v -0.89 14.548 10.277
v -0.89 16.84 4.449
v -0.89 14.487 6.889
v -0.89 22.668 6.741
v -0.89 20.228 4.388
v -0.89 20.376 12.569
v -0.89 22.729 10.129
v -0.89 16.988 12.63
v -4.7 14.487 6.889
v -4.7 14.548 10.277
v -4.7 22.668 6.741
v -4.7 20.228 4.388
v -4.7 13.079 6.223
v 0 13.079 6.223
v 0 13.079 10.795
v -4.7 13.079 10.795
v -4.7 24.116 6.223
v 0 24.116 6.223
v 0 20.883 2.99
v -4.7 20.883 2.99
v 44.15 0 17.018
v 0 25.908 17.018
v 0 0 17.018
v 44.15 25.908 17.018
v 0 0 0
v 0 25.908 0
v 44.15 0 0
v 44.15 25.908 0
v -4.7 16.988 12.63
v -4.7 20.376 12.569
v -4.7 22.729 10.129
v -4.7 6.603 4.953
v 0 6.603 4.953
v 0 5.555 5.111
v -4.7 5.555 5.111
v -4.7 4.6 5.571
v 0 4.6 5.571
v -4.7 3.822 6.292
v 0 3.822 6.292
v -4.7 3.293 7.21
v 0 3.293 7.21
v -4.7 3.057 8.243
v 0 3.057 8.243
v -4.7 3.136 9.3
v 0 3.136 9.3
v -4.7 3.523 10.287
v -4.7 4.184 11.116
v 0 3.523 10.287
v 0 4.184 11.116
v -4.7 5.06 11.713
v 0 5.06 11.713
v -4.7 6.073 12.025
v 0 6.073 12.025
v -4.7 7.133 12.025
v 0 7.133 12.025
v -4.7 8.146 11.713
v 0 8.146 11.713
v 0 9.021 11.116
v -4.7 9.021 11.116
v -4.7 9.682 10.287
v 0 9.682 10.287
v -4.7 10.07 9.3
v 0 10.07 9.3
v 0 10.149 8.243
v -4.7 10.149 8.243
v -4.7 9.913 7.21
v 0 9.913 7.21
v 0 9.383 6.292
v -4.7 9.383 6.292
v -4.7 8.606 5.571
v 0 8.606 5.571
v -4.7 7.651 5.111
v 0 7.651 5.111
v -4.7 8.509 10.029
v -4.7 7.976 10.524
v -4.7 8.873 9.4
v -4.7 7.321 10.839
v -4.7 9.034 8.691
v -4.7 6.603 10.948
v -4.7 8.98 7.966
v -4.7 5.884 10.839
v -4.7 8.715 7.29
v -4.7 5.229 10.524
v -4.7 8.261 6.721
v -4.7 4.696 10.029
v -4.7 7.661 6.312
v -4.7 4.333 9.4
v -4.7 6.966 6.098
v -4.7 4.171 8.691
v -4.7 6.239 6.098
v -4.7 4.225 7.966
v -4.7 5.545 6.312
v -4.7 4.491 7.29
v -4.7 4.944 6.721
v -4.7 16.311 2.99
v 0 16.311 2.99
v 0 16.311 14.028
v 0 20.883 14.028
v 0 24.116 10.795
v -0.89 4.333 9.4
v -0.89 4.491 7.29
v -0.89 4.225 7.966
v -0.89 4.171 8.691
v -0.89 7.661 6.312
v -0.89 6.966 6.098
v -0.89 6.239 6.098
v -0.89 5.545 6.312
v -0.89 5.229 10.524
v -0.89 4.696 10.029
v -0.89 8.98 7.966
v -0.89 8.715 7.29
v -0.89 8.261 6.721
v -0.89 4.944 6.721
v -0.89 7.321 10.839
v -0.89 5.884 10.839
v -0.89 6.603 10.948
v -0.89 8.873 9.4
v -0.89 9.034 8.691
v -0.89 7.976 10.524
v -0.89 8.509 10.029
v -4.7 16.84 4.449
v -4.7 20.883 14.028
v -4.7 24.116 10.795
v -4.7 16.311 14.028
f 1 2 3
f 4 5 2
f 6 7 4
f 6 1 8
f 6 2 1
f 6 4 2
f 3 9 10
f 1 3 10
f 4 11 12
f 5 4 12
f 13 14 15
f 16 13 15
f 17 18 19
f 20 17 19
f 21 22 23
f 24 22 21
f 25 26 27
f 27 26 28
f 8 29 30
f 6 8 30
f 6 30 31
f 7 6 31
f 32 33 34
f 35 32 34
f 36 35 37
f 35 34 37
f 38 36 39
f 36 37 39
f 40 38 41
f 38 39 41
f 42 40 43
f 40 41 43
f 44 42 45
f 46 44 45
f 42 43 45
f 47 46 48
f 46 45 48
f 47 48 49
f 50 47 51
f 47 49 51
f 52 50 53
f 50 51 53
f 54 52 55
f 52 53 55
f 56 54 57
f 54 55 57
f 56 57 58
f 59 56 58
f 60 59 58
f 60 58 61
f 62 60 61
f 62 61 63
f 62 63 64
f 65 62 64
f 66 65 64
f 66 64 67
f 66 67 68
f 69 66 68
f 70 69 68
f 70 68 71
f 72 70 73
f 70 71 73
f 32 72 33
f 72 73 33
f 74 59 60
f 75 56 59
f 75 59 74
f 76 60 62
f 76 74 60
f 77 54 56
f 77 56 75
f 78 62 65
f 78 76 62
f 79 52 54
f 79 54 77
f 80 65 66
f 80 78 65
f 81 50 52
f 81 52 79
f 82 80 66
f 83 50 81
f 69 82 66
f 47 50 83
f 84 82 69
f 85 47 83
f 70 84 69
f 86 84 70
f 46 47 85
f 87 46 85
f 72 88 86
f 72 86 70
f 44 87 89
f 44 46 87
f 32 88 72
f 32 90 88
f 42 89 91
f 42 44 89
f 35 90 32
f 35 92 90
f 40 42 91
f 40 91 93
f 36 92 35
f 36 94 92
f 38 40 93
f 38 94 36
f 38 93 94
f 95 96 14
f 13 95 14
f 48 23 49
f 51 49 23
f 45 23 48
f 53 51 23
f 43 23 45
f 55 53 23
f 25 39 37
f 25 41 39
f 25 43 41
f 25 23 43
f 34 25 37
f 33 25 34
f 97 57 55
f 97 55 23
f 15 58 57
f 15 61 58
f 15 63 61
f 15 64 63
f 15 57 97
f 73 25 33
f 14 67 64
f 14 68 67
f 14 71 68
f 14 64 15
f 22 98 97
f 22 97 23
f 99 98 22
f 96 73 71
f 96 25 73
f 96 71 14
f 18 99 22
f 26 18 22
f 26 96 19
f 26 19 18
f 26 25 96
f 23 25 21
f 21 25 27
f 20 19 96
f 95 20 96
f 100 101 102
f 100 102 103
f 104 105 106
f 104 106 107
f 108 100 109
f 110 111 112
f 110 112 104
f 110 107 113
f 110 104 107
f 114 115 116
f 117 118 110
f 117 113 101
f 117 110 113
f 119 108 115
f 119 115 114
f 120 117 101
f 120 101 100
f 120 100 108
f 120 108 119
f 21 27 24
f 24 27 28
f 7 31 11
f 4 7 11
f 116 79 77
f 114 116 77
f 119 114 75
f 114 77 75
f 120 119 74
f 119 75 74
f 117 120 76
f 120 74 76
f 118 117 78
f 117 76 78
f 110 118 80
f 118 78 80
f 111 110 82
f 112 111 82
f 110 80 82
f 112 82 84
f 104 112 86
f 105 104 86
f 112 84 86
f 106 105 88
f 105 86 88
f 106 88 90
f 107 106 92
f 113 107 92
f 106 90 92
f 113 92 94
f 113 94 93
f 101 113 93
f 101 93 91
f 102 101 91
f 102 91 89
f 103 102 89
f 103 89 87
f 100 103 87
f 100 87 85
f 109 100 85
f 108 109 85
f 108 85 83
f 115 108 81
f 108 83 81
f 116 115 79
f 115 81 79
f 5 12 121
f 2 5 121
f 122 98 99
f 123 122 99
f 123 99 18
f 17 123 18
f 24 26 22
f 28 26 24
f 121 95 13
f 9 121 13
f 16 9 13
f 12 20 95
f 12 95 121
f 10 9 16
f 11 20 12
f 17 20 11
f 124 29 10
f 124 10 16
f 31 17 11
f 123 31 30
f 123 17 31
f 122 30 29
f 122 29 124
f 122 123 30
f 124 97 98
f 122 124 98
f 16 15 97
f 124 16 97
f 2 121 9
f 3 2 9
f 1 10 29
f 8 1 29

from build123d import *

# Parameters (mm, degrees)
SKETCH1_W           = 44.15
SKETCH1_H           = 25.908
BOSS_EXTRUDE1_DEPTH = 17.018
SKETCH2_R           = 3.556
BOSS_EXTRUDE2_DEPTH = 4.7
SKETCH3_R           = 2.438606829
CUT_EXTRUDE1_DEPTH  = 3.81


with BuildPart() as part:
    # Sketch1 → Boss-Extrude1 (new body)
    with BuildSketch(Plane.XY):
        with Locations((22.075, 12.954)):
            Rectangle(SKETCH1_W, SKETCH1_H)
    extrude(amount=BOSS_EXTRUDE1_DEPTH)

    # Sketch2 → Boss-Extrude2 (add)
    with BuildSketch(Plane.ZY):
        with Locations(Location((8.509, 6.602690832, 0), (0, 0, 180))):
            Circle(SKETCH2_R)
        Polygon((14.027892204, 20.883427677), (10.795, 24.116319881), (6.223, 24.116319881), (2.990107796, 20.883427677), (2.990107796, 16.311427677), (6.223, 13.078535474), (10.795, 13.078535474), (14.027892204, 16.311427677), align=None)
    extrude(amount=BOSS_EXTRUDE2_DEPTH)

    # Sketch3 → Cut-Extrude1 (cut)
    with BuildSketch(Plane.ZY.offset(4.7)):
        with Locations((8.509, 6.602690832)):
            Circle(SKETCH3_R)
        Polygon((12.568856448, 20.376314243), (10.129301757, 22.729112808), (6.740596271, 22.667766962), (4.387797706, 20.228212271), (4.449143552, 16.839506785), (6.888698243, 14.48670822), (10.277403729, 14.548054066), (12.630202294, 16.987608757), align=None)
    extrude(amount=-CUT_EXTRUDE1_DEPTH, mode=Mode.SUBTRACT)


solid = part.part
